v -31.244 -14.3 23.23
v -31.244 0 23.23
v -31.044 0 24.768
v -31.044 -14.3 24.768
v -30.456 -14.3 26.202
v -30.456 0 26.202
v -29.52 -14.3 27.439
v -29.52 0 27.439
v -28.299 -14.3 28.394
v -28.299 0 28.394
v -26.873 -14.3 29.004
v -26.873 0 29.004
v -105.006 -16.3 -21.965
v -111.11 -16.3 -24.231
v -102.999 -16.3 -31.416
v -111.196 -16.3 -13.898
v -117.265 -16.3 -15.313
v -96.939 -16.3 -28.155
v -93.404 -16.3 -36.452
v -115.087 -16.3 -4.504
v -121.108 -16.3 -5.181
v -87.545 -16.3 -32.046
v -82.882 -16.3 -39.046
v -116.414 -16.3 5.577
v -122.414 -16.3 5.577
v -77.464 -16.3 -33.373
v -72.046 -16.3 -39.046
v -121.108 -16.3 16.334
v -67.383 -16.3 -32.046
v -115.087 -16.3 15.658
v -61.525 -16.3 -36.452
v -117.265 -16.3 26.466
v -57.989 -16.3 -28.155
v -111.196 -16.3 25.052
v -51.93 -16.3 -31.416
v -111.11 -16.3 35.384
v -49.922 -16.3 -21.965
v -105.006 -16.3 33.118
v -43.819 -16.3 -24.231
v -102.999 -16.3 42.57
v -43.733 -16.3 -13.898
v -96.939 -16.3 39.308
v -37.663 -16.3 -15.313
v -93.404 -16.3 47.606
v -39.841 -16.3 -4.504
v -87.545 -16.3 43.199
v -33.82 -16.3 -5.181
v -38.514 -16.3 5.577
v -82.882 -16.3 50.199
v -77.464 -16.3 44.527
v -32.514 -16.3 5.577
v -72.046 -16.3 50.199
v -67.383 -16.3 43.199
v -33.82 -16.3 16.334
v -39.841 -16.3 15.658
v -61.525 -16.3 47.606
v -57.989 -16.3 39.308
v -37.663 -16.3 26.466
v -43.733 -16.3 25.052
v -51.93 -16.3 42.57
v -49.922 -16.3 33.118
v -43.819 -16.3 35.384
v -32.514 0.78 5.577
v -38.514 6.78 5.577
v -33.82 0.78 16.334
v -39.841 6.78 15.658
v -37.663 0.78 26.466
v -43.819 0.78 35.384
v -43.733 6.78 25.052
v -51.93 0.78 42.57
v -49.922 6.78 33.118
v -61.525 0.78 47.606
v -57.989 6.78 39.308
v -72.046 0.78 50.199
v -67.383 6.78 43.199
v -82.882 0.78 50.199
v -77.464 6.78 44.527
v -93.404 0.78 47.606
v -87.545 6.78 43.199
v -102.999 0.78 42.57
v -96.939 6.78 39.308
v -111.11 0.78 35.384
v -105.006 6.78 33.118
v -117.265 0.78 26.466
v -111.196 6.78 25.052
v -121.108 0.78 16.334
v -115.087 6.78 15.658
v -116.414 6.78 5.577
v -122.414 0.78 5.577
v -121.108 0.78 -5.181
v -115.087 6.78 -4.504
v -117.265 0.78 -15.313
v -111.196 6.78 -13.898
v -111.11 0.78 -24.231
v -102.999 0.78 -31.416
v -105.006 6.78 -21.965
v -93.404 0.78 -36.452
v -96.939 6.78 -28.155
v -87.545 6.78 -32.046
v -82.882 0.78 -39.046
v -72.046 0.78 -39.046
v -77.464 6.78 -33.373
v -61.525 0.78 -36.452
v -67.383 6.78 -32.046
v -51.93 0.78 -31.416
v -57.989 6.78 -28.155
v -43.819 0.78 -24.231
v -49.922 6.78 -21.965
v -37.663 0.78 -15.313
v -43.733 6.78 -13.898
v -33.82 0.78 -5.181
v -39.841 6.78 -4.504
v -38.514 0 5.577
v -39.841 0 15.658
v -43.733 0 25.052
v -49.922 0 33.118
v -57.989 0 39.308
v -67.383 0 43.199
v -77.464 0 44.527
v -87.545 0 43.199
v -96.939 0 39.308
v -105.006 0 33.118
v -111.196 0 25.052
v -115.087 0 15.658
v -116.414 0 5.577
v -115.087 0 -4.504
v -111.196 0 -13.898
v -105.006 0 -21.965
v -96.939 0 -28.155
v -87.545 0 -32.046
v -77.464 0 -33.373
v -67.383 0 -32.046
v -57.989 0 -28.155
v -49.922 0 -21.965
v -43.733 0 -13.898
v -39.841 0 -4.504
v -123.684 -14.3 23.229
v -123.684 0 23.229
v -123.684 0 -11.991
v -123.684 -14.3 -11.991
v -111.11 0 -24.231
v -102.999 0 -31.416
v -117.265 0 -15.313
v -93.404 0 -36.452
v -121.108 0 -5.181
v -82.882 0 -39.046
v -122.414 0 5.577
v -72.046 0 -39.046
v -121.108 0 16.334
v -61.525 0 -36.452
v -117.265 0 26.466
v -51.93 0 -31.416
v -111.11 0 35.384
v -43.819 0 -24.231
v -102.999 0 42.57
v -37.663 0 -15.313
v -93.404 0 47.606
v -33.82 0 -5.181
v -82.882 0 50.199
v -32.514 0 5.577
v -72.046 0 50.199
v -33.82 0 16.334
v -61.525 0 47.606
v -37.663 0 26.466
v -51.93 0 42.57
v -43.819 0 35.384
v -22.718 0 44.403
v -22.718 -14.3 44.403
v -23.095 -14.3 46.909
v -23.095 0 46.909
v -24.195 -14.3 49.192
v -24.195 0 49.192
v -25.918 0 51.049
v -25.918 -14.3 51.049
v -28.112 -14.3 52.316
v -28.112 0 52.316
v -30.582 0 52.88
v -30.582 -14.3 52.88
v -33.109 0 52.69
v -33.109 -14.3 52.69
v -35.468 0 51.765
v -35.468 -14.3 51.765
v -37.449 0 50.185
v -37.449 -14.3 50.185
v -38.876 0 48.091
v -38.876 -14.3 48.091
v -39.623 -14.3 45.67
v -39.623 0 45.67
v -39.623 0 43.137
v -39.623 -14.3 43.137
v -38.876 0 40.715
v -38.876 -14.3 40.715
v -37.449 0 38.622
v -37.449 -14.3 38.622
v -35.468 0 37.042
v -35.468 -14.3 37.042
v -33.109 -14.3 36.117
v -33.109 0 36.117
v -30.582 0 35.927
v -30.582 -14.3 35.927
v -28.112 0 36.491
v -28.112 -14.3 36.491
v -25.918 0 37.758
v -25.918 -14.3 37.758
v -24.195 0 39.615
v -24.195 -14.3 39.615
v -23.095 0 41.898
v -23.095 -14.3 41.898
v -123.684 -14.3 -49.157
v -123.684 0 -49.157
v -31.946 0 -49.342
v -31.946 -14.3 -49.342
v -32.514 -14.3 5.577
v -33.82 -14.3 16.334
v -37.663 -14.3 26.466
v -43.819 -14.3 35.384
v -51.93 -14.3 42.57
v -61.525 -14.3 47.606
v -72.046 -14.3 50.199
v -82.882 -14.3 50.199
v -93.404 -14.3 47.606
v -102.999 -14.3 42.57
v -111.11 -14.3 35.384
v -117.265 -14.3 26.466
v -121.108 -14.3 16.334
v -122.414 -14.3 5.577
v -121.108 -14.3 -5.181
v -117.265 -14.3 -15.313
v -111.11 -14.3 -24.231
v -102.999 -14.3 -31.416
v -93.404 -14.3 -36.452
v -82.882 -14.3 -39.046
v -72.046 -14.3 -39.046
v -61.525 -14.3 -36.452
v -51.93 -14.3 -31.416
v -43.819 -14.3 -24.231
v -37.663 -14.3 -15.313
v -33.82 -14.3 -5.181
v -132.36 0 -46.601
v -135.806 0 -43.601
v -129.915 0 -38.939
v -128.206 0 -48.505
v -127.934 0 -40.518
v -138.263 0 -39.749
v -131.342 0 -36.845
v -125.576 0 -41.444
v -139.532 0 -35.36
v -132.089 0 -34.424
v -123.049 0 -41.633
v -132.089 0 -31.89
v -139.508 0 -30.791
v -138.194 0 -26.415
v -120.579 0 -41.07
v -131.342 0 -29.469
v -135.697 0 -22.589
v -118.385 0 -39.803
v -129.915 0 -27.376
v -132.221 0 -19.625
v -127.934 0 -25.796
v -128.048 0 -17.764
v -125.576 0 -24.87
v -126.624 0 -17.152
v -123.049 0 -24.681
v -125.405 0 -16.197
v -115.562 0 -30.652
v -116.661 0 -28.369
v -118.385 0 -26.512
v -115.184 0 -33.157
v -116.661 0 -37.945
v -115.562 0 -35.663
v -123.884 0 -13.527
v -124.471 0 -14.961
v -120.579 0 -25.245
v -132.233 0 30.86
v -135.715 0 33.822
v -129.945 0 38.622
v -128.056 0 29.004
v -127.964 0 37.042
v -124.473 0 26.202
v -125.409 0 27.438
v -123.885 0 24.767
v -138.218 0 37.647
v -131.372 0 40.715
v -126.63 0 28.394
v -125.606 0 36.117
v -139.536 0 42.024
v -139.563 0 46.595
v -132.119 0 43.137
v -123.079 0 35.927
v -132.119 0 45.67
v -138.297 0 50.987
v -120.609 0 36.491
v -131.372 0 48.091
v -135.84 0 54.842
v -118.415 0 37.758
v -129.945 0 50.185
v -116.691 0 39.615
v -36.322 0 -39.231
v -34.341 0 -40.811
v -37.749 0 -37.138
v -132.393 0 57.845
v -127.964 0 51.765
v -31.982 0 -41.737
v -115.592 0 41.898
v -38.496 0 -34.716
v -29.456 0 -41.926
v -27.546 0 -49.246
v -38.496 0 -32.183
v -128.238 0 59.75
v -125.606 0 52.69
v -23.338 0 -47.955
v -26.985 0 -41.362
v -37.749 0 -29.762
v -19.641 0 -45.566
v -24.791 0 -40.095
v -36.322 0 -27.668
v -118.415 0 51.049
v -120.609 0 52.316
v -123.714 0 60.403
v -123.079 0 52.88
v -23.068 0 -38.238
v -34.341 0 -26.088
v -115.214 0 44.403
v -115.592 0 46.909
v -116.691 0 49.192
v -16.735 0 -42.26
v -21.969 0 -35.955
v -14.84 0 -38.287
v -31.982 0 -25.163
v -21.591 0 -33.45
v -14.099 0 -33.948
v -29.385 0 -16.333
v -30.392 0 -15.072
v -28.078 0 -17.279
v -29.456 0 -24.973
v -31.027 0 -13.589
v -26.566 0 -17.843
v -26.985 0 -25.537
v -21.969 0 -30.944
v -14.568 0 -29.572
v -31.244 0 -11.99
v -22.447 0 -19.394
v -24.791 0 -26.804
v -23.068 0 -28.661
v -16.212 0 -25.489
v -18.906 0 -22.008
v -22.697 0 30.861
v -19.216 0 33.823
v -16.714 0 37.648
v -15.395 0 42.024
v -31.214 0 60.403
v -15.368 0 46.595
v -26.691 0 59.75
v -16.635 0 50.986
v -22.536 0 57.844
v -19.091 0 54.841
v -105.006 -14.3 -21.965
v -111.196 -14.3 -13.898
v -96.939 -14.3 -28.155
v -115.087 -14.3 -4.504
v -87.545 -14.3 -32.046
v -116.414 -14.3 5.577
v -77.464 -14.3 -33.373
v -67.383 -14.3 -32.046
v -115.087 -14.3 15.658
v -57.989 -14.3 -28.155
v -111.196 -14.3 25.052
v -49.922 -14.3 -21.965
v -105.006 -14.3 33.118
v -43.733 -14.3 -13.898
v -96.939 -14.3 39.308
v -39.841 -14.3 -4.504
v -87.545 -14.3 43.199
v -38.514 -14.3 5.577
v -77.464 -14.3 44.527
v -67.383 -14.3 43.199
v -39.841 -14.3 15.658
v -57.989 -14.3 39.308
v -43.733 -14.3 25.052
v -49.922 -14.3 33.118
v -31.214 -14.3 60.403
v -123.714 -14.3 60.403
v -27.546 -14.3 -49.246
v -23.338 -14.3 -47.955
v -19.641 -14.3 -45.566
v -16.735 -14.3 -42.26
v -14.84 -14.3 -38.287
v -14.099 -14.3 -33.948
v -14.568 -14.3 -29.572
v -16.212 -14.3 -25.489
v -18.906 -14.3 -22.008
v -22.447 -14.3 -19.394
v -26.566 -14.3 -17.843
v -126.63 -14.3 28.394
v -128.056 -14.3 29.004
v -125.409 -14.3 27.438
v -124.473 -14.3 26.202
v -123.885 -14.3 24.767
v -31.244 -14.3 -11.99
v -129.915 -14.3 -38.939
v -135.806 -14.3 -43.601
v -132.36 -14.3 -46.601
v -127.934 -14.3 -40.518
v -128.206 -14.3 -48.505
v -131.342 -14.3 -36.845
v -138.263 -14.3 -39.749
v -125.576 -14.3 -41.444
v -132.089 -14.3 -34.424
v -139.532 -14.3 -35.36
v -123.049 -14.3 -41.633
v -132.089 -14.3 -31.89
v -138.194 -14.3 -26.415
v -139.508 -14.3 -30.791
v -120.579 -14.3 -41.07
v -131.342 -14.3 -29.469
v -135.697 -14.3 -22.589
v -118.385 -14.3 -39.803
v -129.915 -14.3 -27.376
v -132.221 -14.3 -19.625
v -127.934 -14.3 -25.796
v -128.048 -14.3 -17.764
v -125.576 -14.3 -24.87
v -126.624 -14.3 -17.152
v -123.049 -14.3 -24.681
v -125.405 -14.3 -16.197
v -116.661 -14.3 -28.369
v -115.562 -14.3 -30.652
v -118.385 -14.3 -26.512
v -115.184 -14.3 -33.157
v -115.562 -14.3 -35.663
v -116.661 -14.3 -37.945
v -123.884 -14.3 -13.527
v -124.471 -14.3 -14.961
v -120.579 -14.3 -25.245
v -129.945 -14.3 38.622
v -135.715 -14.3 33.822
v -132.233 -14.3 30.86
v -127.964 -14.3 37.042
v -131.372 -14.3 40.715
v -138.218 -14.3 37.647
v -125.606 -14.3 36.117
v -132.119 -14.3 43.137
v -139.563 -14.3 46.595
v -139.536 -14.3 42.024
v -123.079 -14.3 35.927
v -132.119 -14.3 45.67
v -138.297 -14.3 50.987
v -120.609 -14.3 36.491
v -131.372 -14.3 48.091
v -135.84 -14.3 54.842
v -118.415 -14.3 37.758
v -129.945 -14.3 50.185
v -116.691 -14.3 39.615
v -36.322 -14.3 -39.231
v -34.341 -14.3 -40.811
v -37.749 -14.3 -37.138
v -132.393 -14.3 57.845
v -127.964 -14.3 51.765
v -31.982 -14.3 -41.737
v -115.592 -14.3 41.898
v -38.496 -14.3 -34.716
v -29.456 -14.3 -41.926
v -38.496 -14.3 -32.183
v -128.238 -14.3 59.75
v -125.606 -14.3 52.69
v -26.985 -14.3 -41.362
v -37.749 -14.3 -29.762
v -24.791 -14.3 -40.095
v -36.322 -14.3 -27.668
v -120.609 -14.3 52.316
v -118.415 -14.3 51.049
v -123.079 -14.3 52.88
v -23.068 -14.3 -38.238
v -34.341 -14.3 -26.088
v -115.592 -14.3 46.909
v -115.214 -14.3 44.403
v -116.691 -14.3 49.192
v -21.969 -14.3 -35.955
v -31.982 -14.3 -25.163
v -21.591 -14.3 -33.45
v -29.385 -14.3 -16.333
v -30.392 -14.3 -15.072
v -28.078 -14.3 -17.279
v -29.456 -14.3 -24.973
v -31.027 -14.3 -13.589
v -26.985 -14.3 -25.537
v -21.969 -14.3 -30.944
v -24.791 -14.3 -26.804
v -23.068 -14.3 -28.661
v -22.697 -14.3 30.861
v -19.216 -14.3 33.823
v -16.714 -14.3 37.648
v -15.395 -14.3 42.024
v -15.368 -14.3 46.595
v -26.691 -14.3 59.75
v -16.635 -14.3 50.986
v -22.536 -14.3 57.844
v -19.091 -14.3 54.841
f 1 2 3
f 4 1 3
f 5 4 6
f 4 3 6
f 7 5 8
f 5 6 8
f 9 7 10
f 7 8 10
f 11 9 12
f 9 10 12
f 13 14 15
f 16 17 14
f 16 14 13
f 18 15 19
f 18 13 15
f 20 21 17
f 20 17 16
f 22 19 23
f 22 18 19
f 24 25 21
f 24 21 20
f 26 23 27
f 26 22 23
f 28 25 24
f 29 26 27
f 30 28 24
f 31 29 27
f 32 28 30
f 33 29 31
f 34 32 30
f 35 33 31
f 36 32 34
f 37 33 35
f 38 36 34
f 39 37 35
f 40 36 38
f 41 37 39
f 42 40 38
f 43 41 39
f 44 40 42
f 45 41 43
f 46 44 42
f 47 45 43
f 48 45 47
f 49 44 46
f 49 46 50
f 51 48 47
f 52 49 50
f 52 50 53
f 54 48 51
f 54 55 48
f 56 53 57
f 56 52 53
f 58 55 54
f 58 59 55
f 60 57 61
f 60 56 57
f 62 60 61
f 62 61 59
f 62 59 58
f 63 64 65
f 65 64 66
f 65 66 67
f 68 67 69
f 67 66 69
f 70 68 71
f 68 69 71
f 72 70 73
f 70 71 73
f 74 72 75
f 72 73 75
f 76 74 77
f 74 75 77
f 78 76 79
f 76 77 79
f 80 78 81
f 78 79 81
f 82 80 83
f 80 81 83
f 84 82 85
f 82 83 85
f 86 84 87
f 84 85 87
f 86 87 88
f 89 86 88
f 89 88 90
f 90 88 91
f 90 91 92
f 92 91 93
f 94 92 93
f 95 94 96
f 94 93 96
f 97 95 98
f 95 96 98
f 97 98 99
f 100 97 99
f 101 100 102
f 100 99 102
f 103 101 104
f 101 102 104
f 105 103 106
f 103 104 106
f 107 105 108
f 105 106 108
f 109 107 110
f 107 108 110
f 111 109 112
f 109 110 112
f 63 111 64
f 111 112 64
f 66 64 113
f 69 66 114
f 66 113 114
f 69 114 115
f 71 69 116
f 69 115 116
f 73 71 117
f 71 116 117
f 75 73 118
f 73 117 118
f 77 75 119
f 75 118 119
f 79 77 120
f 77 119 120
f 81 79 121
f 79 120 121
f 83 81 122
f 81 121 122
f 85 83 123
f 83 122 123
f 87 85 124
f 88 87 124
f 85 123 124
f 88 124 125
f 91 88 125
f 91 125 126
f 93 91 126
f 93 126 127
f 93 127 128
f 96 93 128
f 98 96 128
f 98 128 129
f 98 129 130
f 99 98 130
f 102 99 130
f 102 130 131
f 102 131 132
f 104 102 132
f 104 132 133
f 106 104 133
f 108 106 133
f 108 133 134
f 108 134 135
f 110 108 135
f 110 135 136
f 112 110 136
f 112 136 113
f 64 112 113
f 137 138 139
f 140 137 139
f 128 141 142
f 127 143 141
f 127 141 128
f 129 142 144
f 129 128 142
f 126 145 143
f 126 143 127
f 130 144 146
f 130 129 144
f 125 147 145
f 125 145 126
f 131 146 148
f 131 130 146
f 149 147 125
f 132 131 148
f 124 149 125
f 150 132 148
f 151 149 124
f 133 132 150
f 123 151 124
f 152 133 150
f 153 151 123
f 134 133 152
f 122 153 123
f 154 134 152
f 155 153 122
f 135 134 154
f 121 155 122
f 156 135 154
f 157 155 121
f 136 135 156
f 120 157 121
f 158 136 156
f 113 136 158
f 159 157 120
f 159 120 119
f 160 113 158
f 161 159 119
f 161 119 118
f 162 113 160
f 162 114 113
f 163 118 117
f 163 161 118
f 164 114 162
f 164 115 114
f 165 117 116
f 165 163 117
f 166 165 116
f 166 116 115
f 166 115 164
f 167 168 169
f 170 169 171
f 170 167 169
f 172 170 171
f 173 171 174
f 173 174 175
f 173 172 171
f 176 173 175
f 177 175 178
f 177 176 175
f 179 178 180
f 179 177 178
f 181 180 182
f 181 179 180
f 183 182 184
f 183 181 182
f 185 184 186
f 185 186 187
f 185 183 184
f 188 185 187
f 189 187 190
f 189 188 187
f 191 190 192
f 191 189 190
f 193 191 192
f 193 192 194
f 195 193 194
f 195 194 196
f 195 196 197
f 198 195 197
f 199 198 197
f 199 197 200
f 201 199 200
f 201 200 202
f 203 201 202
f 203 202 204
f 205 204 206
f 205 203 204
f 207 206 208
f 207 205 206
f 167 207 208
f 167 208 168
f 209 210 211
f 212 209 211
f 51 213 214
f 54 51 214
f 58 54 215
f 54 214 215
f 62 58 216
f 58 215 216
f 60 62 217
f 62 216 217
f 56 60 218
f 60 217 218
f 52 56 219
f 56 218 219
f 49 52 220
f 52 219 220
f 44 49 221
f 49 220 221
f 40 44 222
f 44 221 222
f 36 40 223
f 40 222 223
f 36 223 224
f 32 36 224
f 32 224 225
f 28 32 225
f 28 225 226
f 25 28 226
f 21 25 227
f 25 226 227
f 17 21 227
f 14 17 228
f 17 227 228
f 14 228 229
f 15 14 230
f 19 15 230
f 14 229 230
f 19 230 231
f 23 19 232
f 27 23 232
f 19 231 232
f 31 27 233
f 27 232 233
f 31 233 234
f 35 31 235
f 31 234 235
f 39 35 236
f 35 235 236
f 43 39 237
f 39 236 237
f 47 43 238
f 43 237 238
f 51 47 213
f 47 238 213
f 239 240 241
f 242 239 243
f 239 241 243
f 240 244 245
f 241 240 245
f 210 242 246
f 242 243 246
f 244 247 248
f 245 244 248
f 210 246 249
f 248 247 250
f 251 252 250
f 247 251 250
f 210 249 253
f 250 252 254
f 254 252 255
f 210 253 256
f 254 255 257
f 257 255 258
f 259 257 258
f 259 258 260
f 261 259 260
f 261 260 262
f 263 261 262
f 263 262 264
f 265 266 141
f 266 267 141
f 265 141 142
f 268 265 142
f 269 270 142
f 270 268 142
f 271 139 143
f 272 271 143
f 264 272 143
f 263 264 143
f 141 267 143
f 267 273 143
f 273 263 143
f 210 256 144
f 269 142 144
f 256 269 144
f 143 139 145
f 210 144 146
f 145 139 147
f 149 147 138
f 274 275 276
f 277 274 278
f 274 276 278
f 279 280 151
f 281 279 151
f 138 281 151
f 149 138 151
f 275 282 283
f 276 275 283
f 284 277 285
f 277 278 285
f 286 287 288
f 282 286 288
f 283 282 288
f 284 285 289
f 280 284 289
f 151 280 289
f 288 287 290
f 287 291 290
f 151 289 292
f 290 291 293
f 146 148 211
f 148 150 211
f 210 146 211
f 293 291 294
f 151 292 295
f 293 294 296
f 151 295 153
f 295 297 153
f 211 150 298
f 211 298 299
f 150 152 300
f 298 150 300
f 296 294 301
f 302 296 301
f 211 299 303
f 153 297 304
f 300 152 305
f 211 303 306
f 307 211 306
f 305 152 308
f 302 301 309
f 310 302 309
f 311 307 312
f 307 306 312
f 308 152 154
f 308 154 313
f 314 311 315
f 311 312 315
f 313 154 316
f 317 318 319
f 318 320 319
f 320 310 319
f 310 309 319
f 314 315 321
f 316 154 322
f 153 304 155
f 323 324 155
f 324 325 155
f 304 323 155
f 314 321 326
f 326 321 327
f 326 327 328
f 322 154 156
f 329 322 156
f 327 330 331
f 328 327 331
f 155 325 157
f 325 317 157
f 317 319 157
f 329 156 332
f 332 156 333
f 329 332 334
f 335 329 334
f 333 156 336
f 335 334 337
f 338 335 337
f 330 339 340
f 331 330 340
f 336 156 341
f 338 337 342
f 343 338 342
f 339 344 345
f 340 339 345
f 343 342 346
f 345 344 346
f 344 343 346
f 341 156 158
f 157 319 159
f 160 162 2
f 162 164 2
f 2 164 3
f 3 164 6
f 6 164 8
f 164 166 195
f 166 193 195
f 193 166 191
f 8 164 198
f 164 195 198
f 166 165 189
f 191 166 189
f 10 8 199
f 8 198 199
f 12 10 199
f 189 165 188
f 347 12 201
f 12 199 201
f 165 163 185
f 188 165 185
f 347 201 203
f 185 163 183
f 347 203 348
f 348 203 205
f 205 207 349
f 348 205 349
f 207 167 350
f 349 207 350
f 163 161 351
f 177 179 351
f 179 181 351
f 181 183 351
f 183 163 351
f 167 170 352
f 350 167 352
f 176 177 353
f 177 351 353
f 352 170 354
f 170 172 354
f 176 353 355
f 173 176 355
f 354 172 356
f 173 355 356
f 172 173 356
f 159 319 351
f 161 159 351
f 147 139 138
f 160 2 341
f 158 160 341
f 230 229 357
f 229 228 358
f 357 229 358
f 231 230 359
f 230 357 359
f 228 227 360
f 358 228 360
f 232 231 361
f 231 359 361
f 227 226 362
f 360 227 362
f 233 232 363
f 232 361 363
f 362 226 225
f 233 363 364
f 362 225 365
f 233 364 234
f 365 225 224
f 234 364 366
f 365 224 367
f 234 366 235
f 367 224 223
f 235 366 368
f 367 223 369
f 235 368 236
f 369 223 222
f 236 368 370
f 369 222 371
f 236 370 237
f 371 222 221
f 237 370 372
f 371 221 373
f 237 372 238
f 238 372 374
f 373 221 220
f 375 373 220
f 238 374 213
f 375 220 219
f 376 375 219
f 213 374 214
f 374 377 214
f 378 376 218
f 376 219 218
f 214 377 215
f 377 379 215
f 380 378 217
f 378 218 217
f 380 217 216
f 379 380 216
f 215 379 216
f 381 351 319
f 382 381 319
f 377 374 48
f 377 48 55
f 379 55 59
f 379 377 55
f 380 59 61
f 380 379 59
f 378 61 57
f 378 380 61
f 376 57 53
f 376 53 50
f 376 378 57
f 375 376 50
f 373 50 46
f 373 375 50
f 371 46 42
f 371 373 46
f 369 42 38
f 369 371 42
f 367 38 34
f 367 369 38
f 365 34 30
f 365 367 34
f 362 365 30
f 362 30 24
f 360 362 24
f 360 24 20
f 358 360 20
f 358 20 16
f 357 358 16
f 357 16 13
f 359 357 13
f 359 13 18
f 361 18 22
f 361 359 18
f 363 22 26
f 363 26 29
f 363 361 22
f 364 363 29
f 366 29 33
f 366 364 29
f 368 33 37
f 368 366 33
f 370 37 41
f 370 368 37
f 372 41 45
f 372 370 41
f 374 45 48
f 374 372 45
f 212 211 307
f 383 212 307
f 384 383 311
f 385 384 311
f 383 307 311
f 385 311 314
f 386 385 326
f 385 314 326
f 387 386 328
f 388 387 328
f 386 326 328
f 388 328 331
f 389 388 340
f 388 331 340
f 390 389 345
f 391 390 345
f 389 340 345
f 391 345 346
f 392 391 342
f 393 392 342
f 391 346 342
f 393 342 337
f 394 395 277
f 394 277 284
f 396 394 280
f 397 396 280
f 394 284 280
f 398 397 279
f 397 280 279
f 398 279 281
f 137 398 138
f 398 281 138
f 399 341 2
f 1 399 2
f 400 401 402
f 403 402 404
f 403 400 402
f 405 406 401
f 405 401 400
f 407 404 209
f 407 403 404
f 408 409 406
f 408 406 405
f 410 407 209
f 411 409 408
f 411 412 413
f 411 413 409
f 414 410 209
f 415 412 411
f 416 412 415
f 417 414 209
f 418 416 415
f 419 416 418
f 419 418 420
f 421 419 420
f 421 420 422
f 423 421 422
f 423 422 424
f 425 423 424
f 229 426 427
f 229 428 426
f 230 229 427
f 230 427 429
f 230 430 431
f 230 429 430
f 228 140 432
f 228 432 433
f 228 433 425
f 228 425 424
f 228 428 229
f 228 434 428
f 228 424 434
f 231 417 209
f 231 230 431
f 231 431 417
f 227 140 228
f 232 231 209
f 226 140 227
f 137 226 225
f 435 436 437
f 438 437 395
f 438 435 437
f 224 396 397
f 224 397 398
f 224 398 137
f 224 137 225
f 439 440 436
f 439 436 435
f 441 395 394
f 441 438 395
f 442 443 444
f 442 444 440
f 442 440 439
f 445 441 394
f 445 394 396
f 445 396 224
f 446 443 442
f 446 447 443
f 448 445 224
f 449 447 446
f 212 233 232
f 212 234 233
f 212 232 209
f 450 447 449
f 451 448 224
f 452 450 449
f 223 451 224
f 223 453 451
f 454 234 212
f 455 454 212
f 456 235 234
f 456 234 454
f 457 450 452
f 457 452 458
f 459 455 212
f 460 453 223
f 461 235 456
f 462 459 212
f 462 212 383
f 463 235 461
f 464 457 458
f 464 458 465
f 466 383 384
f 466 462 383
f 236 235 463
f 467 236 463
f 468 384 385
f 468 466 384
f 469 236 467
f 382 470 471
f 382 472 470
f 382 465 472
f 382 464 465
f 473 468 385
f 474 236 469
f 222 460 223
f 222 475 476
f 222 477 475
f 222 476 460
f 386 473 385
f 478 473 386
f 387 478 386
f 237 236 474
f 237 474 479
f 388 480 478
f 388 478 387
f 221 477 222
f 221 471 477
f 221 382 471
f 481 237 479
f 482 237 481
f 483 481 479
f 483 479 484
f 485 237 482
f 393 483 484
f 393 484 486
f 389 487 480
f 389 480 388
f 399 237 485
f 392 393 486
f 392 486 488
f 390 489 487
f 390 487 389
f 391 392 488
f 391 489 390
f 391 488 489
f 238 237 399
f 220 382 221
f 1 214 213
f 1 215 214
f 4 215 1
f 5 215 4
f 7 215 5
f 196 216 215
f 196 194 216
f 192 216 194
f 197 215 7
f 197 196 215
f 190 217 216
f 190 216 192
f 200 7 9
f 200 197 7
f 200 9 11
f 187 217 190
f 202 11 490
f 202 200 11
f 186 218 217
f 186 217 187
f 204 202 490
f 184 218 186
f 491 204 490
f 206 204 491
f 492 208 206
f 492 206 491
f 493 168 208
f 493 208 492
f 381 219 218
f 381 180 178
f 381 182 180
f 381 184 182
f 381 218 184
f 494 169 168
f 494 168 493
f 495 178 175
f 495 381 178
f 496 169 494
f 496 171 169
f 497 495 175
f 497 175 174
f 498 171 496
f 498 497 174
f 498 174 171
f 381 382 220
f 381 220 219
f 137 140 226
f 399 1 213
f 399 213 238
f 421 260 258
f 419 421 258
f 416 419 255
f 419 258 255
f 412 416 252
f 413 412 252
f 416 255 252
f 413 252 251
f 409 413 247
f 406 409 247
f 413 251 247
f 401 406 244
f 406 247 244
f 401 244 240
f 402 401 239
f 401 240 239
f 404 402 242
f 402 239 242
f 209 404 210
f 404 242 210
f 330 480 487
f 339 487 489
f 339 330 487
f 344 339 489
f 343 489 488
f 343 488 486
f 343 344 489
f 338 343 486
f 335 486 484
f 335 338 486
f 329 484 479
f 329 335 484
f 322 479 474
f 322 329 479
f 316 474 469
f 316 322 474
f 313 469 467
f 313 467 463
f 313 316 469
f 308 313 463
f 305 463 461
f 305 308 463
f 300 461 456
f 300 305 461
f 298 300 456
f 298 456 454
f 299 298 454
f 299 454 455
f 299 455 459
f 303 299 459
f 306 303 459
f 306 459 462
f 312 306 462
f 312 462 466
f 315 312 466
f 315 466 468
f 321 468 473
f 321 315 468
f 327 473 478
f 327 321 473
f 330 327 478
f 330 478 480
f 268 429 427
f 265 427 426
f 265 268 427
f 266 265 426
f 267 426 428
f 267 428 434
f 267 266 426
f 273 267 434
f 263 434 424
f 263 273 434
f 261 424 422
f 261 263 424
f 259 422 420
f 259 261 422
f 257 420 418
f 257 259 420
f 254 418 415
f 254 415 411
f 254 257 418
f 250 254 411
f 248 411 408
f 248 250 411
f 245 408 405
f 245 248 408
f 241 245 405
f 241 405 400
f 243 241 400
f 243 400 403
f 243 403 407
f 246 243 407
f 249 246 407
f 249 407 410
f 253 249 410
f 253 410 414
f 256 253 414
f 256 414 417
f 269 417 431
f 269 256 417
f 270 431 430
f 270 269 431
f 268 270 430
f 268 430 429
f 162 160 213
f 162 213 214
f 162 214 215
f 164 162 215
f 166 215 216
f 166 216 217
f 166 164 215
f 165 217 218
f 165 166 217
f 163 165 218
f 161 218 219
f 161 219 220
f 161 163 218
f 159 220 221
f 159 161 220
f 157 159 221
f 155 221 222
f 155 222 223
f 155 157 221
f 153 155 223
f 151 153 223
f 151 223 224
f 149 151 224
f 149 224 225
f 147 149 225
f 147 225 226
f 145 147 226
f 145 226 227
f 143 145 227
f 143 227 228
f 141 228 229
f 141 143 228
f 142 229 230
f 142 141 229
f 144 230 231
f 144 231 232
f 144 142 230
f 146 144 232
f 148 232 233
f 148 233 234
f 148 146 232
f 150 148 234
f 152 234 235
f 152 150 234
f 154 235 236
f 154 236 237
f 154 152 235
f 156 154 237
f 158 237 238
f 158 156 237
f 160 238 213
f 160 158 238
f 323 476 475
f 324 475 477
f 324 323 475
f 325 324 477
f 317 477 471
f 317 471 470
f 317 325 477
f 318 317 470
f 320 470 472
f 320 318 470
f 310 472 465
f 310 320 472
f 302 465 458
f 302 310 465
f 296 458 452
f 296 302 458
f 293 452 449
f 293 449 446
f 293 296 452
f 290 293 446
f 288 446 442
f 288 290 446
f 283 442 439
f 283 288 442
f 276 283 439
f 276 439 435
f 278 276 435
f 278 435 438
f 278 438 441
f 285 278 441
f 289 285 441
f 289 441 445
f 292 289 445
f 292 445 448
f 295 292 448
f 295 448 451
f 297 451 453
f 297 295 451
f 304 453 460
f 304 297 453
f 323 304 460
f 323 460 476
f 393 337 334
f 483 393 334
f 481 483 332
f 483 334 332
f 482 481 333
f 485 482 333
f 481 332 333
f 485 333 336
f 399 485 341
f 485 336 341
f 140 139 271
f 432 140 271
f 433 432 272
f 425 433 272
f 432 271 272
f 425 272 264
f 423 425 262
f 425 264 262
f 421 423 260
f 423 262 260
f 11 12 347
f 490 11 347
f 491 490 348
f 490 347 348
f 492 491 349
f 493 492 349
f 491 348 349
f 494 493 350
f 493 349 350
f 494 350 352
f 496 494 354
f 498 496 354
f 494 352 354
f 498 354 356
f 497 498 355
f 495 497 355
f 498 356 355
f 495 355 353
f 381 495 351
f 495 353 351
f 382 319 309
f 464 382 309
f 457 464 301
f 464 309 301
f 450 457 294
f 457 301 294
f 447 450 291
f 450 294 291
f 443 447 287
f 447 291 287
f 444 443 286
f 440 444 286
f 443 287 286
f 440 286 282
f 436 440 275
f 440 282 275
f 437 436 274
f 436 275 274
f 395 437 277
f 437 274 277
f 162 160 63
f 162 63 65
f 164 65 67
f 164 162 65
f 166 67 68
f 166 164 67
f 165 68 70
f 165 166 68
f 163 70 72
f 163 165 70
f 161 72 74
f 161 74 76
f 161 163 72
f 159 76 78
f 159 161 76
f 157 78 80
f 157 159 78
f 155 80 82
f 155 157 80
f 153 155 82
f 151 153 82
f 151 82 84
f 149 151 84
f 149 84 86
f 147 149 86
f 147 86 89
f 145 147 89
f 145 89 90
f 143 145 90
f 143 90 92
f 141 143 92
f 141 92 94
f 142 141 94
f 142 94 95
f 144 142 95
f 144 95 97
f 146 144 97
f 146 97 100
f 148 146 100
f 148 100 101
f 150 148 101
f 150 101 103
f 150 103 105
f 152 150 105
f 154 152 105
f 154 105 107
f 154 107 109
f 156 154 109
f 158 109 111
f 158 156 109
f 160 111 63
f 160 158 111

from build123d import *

# Parameters (mm, degrees)
F0_R     = 8.5
F0_R_2   = 44.95
F1_DEPTH = 14.3
F0_R_3   = 38.95
F2_DEPTH = 8.4
F3_R     = 44.95
F3_R_2   = 38.95
F4_DEPTH = 2


# Not quite as in the source:
# - a fillet or chamfer that OpenCascade refuses, or shapes differently, is made with other operations: its cross-section is extruded or revolved along the edge and cut away or added


with BuildPart() as f1:
    # F0 (on Front) → F1 (new body)
    with BuildSketch(Plane.XZ):
        with BuildLine():
            Line((-31.2142073288, 60.4033983739), (-123.7142073288, 60.4033983739))
            ThreePointArc((-123.7142073288, 60.4033983739), (-139.5634042419, 46.5949633879), (-128.0560255107, 29.0037680252))
            ThreePointArc((-128.0560255107, 29.0037680252), (-124.9004279177, 26.8504331935), (-123.6842073288, 23.2289066444))
            Line((-123.6842073288, 23.2289066444), (-123.6842073288, -11.9910933556))
            ThreePointArc((-123.6842073288, -11.9910933556), (-124.8978631175, -15.6092294905), (-128.0478436925, -17.7636416706))
            ThreePointArc((-128.0478436925, -17.7636416706), (-139.5318474493, -35.3598981178), (-123.6842073288, -49.1571038441))
            Line((-123.6842073288, -49.1571038441), (-31.9460769585, -49.3417102723))
            ThreePointArc((-31.9460769585, -49.3417102723), (-14.3192733633, -36.1434315621), (-26.5660258966, -17.8427261582))
            ThreePointArc((-26.5660258966, -17.8427261582), (-29.9309392076, -15.7364080757), (-31.2442073288, -11.9901373572))
            Line((-31.2442073288, -11.9901373572), (-31.2442073288, 23.2298626428))
            ThreePointArc((-31.2442073288, 23.2298626428), (-30.0282764979, 26.8510064104), (-26.873313267, 29.0044633946))
            ThreePointArc((-26.873313267, 29.0044633946), (-15.3683421549, 46.5945536538), (-31.2142073288, 60.4033983739))
        make_face()
        with Locations((-123.6842073288, -33.1571038441)):
            Circle(F0_R, mode=Mode.SUBTRACT)
        with Locations((-30.0908754106, -33.4496296276)):
            Circle(F0_R, mode=Mode.SUBTRACT)
        with Locations((-77.4642073288, 5.5766425614)):
            Circle(F0_R_2, mode=Mode.SUBTRACT)
        with Locations((-123.7142073288, 44.4033983739)):
            Circle(F0_R, mode=Mode.SUBTRACT)
        with Locations((-31.2175957686, 44.4033987327)):
            Circle(F0_R, mode=Mode.SUBTRACT)
    extrude(amount=F1_DEPTH)

    # F0 (on Front) → F2 (join)
    with BuildSketch(Plane.XZ):
        with Locations((-77.4642073288, 5.5766425614)):
            Circle(F0_R_2)
        with Locations((-77.4642073288, 5.5766425614)):
            Circle(F0_R_3, mode=Mode.SUBTRACT)
    extrude(amount=-F2_DEPTH)

    # F5: chamfer of 7.62 on 1 edges, made by hand

    # F5_s1 → F5_t2 (revolve, cut)
    with BuildSketch(Plane.XY.offset(5.5766425614)):
        Polygon((-32.5142073288, 0.78), (-40.1342073288, 8.4), (-32.5142073288, 8.4), align=None)
    revolve(axis=Axis((-77.4642073288, 8.4, 5.5766425614), (0, -1, 0)), mode=Mode.SUBTRACT)


with BuildPart() as f4:
    # F3 (on face) → F4 (new body)
    with BuildSketch(Plane.XZ.offset(14.3)):
        with Locations((-77.4642073288, 5.5766425614)):
            Circle(F3_R)
        with Locations((-77.4642073288, 5.5766425614)):
            Circle(F3_R_2, mode=Mode.SUBTRACT)
    extrude(amount=F4_DEPTH)


solid = Compound([f1.part, f4.part])
